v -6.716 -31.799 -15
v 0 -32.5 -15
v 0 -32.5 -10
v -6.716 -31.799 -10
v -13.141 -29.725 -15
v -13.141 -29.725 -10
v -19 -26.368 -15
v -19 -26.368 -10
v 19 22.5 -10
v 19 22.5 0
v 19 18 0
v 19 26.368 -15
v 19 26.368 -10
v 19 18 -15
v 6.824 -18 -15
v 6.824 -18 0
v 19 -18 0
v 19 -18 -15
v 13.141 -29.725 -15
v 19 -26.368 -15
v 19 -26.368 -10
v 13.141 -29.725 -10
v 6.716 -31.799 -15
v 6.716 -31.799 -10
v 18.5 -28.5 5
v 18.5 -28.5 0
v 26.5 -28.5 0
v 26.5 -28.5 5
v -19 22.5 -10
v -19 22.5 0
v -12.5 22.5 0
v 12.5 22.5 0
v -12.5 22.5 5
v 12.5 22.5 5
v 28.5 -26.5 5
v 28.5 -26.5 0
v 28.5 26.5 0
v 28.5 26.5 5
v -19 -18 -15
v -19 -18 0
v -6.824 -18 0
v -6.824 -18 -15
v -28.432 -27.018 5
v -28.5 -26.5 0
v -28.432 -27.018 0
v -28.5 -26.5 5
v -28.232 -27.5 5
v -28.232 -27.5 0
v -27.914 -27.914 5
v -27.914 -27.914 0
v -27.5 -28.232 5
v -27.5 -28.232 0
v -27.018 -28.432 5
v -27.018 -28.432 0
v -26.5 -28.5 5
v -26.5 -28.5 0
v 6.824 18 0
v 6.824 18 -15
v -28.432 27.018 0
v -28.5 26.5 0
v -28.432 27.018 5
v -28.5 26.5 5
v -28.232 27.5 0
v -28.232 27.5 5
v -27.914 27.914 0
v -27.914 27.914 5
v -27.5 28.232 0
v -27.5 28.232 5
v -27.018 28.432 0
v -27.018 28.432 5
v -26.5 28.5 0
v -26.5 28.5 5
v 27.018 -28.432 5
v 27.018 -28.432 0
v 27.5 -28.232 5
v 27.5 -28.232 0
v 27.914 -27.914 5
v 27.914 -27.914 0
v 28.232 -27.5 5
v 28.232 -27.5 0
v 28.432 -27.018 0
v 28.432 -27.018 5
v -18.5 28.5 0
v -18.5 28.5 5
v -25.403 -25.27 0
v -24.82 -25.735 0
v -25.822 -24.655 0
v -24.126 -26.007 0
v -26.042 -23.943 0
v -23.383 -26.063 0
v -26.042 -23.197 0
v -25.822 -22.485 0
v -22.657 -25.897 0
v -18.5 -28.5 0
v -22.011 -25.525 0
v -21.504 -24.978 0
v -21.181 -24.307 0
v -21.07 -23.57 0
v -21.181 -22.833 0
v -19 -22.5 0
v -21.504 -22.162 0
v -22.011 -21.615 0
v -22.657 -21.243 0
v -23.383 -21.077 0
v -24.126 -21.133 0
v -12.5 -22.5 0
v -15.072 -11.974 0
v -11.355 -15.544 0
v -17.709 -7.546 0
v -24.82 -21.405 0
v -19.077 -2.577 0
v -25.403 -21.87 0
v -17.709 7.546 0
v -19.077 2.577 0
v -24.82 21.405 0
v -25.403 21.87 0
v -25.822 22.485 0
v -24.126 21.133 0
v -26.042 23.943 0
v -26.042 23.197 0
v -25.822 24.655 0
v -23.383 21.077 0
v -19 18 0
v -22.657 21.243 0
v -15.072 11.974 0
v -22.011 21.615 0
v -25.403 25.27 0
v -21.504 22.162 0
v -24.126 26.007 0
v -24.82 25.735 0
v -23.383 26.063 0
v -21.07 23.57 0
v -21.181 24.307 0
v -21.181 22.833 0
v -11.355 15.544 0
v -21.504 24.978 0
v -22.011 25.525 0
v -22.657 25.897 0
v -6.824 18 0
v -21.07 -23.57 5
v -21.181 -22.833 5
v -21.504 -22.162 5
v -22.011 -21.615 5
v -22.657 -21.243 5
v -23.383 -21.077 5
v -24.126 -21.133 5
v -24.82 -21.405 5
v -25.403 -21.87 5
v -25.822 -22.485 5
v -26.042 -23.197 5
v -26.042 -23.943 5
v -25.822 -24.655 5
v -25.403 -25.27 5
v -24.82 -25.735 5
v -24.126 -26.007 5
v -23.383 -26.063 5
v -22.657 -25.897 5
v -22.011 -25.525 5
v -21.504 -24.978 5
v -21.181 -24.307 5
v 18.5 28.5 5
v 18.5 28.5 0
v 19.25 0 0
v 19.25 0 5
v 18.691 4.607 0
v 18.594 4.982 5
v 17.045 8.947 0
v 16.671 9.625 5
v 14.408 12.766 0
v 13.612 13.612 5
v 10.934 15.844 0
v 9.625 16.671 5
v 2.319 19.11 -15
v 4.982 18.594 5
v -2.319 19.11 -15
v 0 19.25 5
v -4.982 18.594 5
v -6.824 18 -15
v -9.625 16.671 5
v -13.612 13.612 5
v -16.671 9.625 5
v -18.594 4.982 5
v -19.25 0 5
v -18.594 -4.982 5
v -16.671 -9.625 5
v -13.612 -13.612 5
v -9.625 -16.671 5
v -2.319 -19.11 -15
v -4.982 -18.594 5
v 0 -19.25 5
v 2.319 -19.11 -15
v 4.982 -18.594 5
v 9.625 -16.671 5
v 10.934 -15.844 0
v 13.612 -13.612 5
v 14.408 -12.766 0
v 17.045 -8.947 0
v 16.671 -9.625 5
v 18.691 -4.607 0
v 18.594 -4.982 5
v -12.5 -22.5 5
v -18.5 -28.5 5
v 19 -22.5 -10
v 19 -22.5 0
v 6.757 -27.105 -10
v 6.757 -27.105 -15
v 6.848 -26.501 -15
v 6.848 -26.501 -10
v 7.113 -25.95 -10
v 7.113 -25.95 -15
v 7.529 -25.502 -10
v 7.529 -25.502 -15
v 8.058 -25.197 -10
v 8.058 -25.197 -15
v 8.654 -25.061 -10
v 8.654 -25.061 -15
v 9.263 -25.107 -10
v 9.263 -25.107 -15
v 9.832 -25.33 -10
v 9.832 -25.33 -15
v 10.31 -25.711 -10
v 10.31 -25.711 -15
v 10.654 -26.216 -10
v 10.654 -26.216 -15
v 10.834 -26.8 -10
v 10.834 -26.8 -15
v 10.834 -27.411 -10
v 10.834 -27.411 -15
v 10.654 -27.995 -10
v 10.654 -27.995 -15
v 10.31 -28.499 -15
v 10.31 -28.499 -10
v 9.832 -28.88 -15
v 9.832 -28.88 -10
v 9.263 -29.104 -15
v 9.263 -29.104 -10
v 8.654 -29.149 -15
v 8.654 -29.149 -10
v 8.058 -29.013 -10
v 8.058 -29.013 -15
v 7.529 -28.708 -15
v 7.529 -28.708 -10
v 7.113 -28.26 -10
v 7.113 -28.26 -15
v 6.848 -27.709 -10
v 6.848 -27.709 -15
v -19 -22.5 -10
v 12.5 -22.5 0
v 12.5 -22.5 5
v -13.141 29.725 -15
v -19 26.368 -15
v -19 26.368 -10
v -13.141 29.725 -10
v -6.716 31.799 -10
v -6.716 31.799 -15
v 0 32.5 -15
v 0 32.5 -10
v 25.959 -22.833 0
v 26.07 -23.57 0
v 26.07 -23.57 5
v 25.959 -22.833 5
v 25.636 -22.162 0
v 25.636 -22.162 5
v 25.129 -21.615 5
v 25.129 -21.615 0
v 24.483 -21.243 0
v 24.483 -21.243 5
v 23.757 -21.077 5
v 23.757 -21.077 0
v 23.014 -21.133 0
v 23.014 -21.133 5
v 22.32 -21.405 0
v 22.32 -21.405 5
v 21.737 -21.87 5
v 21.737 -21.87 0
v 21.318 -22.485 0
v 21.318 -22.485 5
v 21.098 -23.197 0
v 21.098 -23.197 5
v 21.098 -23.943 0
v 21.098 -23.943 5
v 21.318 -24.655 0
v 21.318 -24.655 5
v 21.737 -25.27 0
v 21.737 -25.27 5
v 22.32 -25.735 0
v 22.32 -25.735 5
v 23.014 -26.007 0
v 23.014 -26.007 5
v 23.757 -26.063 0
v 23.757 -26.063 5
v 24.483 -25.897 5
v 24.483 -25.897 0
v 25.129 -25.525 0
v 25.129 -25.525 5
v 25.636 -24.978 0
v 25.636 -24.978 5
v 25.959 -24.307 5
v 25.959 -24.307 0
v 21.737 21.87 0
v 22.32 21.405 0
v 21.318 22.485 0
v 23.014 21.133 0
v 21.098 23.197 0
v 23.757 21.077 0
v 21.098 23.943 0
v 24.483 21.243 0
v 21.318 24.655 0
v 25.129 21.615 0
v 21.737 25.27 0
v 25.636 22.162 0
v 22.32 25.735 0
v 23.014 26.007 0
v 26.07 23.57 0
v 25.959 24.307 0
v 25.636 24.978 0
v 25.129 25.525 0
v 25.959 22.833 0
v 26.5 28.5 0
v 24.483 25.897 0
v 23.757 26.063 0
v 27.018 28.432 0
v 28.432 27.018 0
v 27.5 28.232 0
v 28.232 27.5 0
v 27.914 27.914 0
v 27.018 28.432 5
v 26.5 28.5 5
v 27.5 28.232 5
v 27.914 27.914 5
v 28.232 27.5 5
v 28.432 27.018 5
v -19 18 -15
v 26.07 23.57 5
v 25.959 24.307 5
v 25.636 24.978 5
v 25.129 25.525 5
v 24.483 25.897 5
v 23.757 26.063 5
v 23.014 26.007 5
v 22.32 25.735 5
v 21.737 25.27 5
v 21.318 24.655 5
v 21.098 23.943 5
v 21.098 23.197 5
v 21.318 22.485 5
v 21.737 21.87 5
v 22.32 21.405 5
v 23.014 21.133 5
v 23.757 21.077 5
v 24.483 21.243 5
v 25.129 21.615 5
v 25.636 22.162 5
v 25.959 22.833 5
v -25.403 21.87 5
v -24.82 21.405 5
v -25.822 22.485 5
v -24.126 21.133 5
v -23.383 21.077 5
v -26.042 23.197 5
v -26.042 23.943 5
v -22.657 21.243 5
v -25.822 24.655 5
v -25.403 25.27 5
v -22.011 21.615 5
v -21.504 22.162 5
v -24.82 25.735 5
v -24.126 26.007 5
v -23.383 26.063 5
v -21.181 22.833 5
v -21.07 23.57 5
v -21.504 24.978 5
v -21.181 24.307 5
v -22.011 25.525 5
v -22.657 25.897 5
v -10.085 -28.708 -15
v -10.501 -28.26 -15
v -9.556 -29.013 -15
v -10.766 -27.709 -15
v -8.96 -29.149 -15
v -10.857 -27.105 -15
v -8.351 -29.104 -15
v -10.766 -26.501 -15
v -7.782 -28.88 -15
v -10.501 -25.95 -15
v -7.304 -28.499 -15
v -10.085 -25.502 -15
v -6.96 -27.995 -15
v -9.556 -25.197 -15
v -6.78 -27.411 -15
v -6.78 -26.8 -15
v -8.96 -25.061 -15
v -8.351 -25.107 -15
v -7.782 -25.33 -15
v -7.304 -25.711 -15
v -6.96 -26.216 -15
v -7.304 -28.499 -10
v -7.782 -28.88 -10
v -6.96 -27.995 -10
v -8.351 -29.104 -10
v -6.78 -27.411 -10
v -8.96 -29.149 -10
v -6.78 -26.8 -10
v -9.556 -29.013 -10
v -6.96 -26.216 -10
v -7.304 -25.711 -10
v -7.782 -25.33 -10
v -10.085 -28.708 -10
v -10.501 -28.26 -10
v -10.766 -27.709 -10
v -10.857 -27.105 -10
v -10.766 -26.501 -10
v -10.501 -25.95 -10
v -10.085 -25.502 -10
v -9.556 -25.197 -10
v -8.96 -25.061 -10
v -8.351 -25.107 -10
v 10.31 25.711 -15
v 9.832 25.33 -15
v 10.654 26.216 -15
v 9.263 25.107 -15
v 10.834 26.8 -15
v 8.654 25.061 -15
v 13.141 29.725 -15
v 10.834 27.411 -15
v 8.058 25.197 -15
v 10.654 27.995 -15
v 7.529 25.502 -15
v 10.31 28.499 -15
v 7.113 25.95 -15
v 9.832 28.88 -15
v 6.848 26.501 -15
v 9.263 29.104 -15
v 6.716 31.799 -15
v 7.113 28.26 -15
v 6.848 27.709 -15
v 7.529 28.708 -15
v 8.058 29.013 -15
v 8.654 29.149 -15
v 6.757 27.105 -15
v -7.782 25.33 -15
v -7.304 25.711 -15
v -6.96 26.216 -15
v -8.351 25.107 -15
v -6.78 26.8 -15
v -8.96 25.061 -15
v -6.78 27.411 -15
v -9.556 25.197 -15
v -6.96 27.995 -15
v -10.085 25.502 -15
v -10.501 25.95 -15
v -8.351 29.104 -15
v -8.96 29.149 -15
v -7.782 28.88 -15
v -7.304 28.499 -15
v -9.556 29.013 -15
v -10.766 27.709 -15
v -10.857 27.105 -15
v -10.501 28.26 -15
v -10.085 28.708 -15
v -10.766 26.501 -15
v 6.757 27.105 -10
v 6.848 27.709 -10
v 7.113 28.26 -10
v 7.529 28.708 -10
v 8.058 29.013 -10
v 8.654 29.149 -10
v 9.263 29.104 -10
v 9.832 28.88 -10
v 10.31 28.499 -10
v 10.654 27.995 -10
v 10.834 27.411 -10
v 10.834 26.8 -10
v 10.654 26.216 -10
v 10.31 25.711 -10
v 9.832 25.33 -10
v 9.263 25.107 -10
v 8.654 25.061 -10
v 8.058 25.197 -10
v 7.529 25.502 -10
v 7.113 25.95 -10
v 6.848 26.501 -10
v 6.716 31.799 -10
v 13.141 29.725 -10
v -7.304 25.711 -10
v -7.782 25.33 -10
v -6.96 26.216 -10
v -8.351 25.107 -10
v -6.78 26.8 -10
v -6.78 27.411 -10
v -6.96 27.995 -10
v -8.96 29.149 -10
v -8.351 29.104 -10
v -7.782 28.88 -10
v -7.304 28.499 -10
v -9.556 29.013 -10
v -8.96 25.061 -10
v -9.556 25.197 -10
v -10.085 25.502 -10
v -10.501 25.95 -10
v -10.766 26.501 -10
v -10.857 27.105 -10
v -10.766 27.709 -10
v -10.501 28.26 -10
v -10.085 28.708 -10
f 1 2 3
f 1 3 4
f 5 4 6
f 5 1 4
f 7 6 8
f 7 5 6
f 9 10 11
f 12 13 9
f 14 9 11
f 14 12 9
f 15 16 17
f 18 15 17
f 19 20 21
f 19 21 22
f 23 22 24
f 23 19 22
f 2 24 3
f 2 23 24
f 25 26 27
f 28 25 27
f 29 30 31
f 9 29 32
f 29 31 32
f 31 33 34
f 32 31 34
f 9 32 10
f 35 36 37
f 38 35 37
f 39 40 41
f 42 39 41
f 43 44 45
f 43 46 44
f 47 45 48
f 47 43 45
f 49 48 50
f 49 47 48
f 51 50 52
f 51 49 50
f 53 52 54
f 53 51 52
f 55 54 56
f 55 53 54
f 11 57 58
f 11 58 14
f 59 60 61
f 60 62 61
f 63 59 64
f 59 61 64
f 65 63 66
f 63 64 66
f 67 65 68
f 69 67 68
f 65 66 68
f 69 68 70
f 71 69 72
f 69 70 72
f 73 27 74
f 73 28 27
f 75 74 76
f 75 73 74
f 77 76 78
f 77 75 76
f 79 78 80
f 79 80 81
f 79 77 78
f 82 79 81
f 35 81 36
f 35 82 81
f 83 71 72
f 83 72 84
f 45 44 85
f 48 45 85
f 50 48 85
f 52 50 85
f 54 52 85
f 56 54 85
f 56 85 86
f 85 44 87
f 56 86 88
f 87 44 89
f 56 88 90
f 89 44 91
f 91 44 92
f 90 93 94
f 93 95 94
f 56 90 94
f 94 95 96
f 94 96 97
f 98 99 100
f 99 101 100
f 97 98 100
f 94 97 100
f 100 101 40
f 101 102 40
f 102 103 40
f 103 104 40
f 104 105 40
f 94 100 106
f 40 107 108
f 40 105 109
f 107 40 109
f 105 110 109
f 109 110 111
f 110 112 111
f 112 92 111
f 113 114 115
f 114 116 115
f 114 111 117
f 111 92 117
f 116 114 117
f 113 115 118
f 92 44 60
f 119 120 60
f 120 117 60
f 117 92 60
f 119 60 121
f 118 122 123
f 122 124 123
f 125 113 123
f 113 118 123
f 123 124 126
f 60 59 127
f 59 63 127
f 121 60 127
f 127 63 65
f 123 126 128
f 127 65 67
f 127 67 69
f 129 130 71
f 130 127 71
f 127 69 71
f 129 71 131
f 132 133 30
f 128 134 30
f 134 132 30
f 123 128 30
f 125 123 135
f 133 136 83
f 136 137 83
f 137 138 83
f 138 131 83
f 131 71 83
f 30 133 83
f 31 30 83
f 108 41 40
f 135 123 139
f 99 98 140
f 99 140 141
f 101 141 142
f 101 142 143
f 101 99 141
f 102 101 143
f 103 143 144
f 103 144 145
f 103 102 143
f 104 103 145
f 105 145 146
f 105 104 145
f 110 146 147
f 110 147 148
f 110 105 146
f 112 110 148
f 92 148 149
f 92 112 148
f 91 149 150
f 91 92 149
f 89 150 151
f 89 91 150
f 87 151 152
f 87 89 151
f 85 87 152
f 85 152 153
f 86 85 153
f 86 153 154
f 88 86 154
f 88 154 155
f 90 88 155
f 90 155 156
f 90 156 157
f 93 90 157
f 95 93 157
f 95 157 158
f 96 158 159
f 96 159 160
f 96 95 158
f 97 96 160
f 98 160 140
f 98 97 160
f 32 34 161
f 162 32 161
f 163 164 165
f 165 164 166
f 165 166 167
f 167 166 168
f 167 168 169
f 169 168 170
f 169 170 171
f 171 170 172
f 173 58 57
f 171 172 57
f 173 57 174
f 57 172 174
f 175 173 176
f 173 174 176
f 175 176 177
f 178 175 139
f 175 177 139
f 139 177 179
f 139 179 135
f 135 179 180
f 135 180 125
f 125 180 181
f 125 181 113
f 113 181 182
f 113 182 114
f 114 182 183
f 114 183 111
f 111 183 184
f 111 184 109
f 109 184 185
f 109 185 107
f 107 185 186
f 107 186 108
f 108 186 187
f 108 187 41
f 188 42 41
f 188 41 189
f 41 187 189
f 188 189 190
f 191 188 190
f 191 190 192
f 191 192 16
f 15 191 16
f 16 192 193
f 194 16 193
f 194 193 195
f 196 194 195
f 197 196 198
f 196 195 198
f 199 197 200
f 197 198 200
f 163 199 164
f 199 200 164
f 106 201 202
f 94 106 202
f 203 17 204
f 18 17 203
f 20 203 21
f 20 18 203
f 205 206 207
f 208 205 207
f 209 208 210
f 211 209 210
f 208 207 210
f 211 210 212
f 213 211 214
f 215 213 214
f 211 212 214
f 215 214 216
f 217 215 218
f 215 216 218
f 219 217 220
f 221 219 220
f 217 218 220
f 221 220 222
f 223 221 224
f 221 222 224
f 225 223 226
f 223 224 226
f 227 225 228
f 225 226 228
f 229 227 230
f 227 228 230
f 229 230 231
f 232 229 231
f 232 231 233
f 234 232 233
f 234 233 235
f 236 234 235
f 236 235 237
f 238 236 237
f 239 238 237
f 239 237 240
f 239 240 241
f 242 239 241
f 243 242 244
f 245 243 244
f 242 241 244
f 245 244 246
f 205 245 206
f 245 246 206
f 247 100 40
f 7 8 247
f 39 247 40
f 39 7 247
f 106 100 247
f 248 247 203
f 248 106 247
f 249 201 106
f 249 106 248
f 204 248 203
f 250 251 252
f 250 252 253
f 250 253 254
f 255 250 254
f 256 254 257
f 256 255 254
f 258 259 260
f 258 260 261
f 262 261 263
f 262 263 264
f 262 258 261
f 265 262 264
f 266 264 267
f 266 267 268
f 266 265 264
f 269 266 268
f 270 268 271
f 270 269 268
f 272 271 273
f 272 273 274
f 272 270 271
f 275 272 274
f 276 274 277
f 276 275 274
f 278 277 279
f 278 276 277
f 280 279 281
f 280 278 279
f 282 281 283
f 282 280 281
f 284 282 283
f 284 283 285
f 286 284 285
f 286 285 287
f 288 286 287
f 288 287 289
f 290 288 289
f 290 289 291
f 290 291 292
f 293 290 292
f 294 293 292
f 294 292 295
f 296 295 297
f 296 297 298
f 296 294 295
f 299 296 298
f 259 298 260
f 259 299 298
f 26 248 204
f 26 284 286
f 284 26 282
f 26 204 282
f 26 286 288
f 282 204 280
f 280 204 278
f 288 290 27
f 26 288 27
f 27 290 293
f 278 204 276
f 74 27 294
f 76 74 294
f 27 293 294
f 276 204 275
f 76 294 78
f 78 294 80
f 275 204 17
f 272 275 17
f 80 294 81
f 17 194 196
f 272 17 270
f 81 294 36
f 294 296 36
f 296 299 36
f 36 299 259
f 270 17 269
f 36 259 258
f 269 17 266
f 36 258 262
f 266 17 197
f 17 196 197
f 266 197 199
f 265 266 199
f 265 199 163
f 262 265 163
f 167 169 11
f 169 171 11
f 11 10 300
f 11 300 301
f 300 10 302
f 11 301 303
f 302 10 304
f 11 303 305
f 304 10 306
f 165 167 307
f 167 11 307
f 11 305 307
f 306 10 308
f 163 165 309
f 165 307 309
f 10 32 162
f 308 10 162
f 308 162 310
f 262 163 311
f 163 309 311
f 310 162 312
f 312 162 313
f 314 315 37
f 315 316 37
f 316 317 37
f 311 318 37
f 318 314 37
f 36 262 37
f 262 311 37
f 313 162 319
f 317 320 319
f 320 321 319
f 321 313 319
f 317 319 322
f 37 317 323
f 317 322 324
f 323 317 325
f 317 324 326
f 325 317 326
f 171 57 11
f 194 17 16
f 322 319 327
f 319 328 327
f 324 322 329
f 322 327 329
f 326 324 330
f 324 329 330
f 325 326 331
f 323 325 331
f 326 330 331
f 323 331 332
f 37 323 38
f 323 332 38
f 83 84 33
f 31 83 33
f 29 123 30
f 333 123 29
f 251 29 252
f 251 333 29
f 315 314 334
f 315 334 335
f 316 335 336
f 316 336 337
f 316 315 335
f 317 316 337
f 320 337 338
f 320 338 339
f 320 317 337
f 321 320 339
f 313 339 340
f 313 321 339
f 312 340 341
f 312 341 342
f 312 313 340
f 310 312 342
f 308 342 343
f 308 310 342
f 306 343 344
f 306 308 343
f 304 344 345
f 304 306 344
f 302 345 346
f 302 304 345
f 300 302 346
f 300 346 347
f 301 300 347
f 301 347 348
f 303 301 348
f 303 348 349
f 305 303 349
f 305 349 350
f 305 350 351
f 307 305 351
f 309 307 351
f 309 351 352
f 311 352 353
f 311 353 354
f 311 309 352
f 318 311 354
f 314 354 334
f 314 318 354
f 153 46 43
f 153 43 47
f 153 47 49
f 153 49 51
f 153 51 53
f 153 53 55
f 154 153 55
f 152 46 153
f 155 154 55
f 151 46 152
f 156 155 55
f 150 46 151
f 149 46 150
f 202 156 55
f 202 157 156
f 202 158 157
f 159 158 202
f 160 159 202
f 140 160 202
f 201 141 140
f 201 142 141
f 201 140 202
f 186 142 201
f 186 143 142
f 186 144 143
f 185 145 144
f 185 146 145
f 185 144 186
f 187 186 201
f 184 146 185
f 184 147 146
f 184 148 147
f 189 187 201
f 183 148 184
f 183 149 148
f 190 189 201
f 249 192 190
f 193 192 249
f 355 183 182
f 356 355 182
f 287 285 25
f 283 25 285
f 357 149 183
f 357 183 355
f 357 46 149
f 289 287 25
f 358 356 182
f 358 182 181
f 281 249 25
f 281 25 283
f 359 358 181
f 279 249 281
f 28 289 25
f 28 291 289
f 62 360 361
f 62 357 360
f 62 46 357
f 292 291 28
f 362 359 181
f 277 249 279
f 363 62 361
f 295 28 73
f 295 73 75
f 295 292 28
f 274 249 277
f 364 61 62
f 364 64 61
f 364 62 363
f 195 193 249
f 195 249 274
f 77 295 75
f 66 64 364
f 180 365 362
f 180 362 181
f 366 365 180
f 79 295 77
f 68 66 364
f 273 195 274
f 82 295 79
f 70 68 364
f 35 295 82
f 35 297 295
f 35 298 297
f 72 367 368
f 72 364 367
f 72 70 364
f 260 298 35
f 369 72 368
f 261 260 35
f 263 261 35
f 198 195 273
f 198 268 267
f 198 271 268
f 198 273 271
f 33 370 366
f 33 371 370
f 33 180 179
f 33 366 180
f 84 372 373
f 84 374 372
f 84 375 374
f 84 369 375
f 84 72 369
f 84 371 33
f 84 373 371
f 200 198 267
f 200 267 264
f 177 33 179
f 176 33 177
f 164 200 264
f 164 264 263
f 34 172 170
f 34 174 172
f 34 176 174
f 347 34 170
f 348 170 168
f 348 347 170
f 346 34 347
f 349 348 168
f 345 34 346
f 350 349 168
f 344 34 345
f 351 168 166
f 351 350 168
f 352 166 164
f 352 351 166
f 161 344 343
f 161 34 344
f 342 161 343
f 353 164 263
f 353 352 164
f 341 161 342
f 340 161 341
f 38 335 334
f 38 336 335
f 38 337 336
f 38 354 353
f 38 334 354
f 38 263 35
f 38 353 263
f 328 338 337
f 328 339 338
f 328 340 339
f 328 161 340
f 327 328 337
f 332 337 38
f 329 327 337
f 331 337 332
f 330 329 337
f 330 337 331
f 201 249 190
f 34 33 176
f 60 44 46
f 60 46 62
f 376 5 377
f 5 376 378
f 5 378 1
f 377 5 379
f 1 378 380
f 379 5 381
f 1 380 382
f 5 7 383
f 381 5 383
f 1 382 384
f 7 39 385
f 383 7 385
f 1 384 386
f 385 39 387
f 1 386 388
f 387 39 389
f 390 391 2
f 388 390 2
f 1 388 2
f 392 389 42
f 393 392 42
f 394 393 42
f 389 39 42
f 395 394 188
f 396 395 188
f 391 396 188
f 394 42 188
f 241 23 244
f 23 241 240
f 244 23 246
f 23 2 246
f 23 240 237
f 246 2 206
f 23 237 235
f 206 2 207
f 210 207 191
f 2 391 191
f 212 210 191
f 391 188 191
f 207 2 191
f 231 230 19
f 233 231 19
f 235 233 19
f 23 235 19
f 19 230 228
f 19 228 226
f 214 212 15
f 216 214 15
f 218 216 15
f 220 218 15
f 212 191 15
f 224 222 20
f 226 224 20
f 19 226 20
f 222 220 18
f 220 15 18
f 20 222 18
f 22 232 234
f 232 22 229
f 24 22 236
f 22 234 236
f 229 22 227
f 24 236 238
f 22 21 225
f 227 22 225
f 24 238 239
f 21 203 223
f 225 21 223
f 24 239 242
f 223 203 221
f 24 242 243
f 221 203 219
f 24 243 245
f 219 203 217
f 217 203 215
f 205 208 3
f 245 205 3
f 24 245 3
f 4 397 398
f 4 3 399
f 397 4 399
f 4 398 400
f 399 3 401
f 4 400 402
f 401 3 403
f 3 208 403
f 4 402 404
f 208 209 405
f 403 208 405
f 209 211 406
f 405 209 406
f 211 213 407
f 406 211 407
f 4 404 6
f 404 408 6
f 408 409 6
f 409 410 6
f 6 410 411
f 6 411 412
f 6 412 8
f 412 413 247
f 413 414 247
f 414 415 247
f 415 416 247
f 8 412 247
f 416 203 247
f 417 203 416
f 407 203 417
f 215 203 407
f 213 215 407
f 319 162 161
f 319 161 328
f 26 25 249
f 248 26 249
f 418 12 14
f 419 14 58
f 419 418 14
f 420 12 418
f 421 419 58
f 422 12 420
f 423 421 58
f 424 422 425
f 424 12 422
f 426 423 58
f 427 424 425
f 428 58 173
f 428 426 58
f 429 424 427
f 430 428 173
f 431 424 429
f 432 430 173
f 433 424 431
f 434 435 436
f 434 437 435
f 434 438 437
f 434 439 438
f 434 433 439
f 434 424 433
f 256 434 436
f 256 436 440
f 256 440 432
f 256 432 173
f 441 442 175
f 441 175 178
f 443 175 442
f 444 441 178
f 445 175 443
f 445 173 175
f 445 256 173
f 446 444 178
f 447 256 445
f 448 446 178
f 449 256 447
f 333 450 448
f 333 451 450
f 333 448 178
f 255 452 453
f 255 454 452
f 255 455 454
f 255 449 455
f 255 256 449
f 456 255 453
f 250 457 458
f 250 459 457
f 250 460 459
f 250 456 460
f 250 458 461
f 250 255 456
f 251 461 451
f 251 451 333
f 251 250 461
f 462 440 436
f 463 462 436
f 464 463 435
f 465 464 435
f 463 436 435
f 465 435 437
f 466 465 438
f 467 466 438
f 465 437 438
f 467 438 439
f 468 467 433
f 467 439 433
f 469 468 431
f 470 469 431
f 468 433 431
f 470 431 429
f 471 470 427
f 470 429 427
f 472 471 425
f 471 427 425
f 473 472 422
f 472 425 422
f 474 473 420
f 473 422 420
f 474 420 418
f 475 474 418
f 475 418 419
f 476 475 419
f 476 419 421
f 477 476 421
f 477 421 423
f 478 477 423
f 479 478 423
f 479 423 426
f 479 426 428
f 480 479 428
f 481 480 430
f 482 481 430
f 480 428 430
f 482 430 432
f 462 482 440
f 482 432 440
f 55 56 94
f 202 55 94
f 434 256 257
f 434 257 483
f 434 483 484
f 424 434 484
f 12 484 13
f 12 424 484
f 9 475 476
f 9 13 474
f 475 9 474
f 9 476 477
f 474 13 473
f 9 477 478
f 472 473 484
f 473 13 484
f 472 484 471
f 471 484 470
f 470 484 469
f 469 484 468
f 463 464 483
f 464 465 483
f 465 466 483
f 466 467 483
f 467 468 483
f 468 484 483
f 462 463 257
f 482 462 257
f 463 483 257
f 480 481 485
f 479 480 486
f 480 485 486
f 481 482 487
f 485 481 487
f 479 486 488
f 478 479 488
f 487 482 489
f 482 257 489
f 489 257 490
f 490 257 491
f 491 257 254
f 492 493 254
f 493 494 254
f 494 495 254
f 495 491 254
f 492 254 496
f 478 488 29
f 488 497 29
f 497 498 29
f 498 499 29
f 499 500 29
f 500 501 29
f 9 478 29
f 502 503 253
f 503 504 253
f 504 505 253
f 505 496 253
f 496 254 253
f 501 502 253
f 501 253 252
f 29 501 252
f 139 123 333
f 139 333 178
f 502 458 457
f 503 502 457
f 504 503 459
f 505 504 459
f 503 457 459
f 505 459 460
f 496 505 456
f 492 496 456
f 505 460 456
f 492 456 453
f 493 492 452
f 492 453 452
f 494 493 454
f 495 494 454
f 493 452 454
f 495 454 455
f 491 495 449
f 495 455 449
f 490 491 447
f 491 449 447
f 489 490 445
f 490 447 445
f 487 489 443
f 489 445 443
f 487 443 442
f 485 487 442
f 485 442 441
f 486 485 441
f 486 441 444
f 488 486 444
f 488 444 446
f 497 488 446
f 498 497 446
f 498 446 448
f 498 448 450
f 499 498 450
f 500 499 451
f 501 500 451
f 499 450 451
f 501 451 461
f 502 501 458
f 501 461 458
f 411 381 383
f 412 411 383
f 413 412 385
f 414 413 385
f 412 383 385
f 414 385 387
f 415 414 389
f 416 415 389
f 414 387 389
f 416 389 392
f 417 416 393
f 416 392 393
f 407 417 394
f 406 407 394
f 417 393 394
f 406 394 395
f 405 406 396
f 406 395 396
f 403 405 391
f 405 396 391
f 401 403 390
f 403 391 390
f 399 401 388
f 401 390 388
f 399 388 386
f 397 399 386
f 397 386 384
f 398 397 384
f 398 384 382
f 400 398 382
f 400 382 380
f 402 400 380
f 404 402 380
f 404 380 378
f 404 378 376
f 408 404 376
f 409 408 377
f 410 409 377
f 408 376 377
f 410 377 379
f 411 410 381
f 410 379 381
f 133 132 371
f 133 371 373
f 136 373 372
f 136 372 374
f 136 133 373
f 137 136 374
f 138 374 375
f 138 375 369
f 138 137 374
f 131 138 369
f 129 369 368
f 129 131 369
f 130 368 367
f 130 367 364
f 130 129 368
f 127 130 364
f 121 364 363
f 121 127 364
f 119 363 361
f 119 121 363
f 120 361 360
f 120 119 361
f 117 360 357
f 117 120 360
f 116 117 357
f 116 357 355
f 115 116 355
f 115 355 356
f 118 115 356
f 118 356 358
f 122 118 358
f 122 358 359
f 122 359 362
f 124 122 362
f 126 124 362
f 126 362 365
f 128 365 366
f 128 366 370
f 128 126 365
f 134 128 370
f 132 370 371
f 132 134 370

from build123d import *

# Parameters (mm, degrees)
SKETCH1_W           = 38
SKETCH1_H           = 36
SKETCH1_R           = 1.55
SKETCH1_R_2         = 11.5
BOSS_EXTRUDE1_DEPTH = 5
SKETCH2_W           = 38
SKETCH2_H           = 4.5
BOSS_EXTRUDE2_DEPTH = 20
SKETCH3_R           = 2.05
BOSS_EXTRUDE3_DEPTH = 5
BOSS_EXTRUDE4_START = -5
SKETCH4_W           = 57
SKETCH4_H           = 57
SKETCH4_R           = 2.5
SKETCH4_W_2         = 38
SKETCH4_H_2         = 45
SKETCH4_R_2         = 1.55
SKETCH4_R_3         = 11.5
BOSS_EXTRUDE4_DEPTH = 5
FILLET2_R           = 2
SKETCH6_R           = 19.25
CUT_EXTRUDE2_DEPTH  = 48.628772816
CUT_EXTRUDE3_DEPTH  = 5


with BuildPart() as part:
    # Sketch1 → Boss-Extrude1 (new body)
    with BuildSketch(Plane.XY):
        Rectangle(SKETCH1_W, SKETCH1_H)
        with Locations((15.5, 15.5)):
            Circle(SKETCH1_R, mode=Mode.SUBTRACT)
        with Locations((-15.5, 15.5)):
            Circle(SKETCH1_R, mode=Mode.SUBTRACT)
        with Locations((15.5, -15.5)):
            Circle(SKETCH1_R, mode=Mode.SUBTRACT)
        with Locations((-15.5, -15.5)):
            Circle(SKETCH1_R, mode=Mode.SUBTRACT)
        Circle(SKETCH1_R_2, mode=Mode.SUBTRACT)
    extrude(amount=BOSS_EXTRUDE1_DEPTH)

    # Sketch2 → Boss-Extrude2 (add)
    with BuildSketch(Plane.XY.offset(5)):
        with Locations((0, 20.25)):
            Rectangle(SKETCH2_W, SKETCH2_H)
        with Locations((0, -20.25)):
            Rectangle(SKETCH2_W, SKETCH2_H)
    extrude(amount=-BOSS_EXTRUDE2_DEPTH)

    # Sketch3 → Boss-Extrude3 (add)
    # profile 1 of 2: a face of its own
    with BuildSketch(Plane(origin=(0, 0, -15), x_dir=(-1, 0, 0), z_dir=(0, 0, -1))):
        with BuildLine():
            Line((-19, 26.367593747), (-19, 22.5))
            Line((-19, 22.5), (19, 22.5))
            Line((19, 22.5), (19, 26.367593747))
            ThreePointArc((19, 26.367593747), (9.982564879, 30.928924948), (-6e-09, 32.5))
            ThreePointArc((-6e-09, 32.5), (-9.982564884, 30.928924946), (-19, 26.367593747))
        make_face()
        with Locations((-8.80698434, 27.105110714)):
            Circle(SKETCH3_R, mode=Mode.SUBTRACT)
        with Locations((8.80698434, 27.105110714)):
            Circle(SKETCH3_R, mode=Mode.SUBTRACT)
    # profile 2 of 2: a face of its own
    with BuildSketch(Plane(origin=(0, 0, -15), x_dir=(-1, 0, 0), z_dir=(0, 0, -1))):
        with BuildLine():
            Line((-19, -22.5), (-19, -26.367593747))
            ThreePointArc((-19, -26.367593747), (-9.982564919, -30.928924935), (-7.8e-08, -32.5))
            ThreePointArc((-7.8e-08, -32.5), (9.982564844, -30.928924959), (19, -26.367593747))
            Line((19, -26.367593747), (19, -22.5))
            Line((19, -22.5), (-19, -22.5))
        make_face()
        with Locations((-8.80698434, -27.105110714)):
            Circle(SKETCH3_R, mode=Mode.SUBTRACT)
        with Locations((8.80698434, -27.105110714)):
            Circle(SKETCH3_R, mode=Mode.SUBTRACT)
    extrude(amount=-BOSS_EXTRUDE3_DEPTH)

    # Sketch4 → Boss-Extrude4 (add)
    # profile 1 of 6: a face of its own
    with BuildSketch(Plane.XY.offset(5).offset(BOSS_EXTRUDE4_START)):
        Rectangle(SKETCH4_W, SKETCH4_H)
        with Locations((-23.57, -23.57)):
            Circle(SKETCH4_R, mode=Mode.SUBTRACT)
        with Locations((23.57, -23.57)):
            Circle(SKETCH4_R, mode=Mode.SUBTRACT)
        Rectangle(SKETCH4_W_2, SKETCH4_H_2, mode=Mode.SUBTRACT)
        with Locations((-23.57, 23.57)):
            Circle(SKETCH4_R, mode=Mode.SUBTRACT)
        with Locations((23.57, 23.57)):
            Circle(SKETCH4_R, mode=Mode.SUBTRACT)
    # profile 2 of 6: a face of its own
    with BuildSketch(Plane.XY.offset(5).offset(BOSS_EXTRUDE4_START)):
        Rectangle(SKETCH4_W_2, SKETCH4_H_2)
        with Locations((-15.5, -15.5)):
            Circle(SKETCH4_R_2, mode=Mode.SUBTRACT)
        Circle(SKETCH4_R_3, mode=Mode.SUBTRACT)
        with Locations((15.5, -15.5)):
            Circle(SKETCH4_R_2, mode=Mode.SUBTRACT)
        with Locations((-15.5, 15.5)):
            Circle(SKETCH4_R_2, mode=Mode.SUBTRACT)
        with Locations((15.5, 15.5)):
            Circle(SKETCH4_R_2, mode=Mode.SUBTRACT)
    # profile 3 of 6: a face of its own
    with BuildSketch(Plane.XY.offset(5).offset(BOSS_EXTRUDE4_START)):
        with Locations((-15.5, 15.5)):
            Circle(SKETCH4_R_2)
    # profile 4 of 6: a face of its own
    with BuildSketch(Plane.XY.offset(5).offset(BOSS_EXTRUDE4_START)):
        with Locations((-15.5, -15.5)):
            Circle(SKETCH4_R_2)
    # profile 5 of 6: a face of its own
    with BuildSketch(Plane.XY.offset(5).offset(BOSS_EXTRUDE4_START)):
        with Locations((15.5, -15.5)):
            Circle(SKETCH4_R_2)
    # profile 6 of 6: a face of its own
    with BuildSketch(Plane.XY.offset(5).offset(BOSS_EXTRUDE4_START)):
        with Locations((15.5, 15.5)):
            Circle(SKETCH4_R_2)
    extrude(amount=BOSS_EXTRUDE4_DEPTH)

    # Fillet2
    fillet2_edges = [part.edges().sort_by_distance(p)[0] for p in [
        (28.5, -28.5, 2.5),
        (-28.5, -28.5, 2.5),
        (-28.5, 28.5, 2.5),
        (28.5, 28.5, 2.5),
    ]]
    fillet(fillet2_edges, radius=FILLET2_R)

    # Sketch6 → Cut-Extrude2 (cut, through all)
    with BuildSketch(Plane.XY.offset(5)):
        Circle(SKETCH6_R)
    extrude(amount=-CUT_EXTRUDE2_DEPTH, mode=Mode.SUBTRACT)

    # Sketch7 → Cut-Extrude3 (cut)
    with BuildSketch(Plane.XY.offset(5)):
        Polygon((18.5, 28.5), (-18.5, 28.5), (-12.5, 22.5), (12.5, 22.5), align=None)
        Polygon((-12.5, -22.5), (-18.5, -28.5), (18.5, -28.5), (12.5, -22.5), align=None)
    extrude(amount=-CUT_EXTRUDE3_DEPTH, mode=Mode.SUBTRACT)


solid = part.part
